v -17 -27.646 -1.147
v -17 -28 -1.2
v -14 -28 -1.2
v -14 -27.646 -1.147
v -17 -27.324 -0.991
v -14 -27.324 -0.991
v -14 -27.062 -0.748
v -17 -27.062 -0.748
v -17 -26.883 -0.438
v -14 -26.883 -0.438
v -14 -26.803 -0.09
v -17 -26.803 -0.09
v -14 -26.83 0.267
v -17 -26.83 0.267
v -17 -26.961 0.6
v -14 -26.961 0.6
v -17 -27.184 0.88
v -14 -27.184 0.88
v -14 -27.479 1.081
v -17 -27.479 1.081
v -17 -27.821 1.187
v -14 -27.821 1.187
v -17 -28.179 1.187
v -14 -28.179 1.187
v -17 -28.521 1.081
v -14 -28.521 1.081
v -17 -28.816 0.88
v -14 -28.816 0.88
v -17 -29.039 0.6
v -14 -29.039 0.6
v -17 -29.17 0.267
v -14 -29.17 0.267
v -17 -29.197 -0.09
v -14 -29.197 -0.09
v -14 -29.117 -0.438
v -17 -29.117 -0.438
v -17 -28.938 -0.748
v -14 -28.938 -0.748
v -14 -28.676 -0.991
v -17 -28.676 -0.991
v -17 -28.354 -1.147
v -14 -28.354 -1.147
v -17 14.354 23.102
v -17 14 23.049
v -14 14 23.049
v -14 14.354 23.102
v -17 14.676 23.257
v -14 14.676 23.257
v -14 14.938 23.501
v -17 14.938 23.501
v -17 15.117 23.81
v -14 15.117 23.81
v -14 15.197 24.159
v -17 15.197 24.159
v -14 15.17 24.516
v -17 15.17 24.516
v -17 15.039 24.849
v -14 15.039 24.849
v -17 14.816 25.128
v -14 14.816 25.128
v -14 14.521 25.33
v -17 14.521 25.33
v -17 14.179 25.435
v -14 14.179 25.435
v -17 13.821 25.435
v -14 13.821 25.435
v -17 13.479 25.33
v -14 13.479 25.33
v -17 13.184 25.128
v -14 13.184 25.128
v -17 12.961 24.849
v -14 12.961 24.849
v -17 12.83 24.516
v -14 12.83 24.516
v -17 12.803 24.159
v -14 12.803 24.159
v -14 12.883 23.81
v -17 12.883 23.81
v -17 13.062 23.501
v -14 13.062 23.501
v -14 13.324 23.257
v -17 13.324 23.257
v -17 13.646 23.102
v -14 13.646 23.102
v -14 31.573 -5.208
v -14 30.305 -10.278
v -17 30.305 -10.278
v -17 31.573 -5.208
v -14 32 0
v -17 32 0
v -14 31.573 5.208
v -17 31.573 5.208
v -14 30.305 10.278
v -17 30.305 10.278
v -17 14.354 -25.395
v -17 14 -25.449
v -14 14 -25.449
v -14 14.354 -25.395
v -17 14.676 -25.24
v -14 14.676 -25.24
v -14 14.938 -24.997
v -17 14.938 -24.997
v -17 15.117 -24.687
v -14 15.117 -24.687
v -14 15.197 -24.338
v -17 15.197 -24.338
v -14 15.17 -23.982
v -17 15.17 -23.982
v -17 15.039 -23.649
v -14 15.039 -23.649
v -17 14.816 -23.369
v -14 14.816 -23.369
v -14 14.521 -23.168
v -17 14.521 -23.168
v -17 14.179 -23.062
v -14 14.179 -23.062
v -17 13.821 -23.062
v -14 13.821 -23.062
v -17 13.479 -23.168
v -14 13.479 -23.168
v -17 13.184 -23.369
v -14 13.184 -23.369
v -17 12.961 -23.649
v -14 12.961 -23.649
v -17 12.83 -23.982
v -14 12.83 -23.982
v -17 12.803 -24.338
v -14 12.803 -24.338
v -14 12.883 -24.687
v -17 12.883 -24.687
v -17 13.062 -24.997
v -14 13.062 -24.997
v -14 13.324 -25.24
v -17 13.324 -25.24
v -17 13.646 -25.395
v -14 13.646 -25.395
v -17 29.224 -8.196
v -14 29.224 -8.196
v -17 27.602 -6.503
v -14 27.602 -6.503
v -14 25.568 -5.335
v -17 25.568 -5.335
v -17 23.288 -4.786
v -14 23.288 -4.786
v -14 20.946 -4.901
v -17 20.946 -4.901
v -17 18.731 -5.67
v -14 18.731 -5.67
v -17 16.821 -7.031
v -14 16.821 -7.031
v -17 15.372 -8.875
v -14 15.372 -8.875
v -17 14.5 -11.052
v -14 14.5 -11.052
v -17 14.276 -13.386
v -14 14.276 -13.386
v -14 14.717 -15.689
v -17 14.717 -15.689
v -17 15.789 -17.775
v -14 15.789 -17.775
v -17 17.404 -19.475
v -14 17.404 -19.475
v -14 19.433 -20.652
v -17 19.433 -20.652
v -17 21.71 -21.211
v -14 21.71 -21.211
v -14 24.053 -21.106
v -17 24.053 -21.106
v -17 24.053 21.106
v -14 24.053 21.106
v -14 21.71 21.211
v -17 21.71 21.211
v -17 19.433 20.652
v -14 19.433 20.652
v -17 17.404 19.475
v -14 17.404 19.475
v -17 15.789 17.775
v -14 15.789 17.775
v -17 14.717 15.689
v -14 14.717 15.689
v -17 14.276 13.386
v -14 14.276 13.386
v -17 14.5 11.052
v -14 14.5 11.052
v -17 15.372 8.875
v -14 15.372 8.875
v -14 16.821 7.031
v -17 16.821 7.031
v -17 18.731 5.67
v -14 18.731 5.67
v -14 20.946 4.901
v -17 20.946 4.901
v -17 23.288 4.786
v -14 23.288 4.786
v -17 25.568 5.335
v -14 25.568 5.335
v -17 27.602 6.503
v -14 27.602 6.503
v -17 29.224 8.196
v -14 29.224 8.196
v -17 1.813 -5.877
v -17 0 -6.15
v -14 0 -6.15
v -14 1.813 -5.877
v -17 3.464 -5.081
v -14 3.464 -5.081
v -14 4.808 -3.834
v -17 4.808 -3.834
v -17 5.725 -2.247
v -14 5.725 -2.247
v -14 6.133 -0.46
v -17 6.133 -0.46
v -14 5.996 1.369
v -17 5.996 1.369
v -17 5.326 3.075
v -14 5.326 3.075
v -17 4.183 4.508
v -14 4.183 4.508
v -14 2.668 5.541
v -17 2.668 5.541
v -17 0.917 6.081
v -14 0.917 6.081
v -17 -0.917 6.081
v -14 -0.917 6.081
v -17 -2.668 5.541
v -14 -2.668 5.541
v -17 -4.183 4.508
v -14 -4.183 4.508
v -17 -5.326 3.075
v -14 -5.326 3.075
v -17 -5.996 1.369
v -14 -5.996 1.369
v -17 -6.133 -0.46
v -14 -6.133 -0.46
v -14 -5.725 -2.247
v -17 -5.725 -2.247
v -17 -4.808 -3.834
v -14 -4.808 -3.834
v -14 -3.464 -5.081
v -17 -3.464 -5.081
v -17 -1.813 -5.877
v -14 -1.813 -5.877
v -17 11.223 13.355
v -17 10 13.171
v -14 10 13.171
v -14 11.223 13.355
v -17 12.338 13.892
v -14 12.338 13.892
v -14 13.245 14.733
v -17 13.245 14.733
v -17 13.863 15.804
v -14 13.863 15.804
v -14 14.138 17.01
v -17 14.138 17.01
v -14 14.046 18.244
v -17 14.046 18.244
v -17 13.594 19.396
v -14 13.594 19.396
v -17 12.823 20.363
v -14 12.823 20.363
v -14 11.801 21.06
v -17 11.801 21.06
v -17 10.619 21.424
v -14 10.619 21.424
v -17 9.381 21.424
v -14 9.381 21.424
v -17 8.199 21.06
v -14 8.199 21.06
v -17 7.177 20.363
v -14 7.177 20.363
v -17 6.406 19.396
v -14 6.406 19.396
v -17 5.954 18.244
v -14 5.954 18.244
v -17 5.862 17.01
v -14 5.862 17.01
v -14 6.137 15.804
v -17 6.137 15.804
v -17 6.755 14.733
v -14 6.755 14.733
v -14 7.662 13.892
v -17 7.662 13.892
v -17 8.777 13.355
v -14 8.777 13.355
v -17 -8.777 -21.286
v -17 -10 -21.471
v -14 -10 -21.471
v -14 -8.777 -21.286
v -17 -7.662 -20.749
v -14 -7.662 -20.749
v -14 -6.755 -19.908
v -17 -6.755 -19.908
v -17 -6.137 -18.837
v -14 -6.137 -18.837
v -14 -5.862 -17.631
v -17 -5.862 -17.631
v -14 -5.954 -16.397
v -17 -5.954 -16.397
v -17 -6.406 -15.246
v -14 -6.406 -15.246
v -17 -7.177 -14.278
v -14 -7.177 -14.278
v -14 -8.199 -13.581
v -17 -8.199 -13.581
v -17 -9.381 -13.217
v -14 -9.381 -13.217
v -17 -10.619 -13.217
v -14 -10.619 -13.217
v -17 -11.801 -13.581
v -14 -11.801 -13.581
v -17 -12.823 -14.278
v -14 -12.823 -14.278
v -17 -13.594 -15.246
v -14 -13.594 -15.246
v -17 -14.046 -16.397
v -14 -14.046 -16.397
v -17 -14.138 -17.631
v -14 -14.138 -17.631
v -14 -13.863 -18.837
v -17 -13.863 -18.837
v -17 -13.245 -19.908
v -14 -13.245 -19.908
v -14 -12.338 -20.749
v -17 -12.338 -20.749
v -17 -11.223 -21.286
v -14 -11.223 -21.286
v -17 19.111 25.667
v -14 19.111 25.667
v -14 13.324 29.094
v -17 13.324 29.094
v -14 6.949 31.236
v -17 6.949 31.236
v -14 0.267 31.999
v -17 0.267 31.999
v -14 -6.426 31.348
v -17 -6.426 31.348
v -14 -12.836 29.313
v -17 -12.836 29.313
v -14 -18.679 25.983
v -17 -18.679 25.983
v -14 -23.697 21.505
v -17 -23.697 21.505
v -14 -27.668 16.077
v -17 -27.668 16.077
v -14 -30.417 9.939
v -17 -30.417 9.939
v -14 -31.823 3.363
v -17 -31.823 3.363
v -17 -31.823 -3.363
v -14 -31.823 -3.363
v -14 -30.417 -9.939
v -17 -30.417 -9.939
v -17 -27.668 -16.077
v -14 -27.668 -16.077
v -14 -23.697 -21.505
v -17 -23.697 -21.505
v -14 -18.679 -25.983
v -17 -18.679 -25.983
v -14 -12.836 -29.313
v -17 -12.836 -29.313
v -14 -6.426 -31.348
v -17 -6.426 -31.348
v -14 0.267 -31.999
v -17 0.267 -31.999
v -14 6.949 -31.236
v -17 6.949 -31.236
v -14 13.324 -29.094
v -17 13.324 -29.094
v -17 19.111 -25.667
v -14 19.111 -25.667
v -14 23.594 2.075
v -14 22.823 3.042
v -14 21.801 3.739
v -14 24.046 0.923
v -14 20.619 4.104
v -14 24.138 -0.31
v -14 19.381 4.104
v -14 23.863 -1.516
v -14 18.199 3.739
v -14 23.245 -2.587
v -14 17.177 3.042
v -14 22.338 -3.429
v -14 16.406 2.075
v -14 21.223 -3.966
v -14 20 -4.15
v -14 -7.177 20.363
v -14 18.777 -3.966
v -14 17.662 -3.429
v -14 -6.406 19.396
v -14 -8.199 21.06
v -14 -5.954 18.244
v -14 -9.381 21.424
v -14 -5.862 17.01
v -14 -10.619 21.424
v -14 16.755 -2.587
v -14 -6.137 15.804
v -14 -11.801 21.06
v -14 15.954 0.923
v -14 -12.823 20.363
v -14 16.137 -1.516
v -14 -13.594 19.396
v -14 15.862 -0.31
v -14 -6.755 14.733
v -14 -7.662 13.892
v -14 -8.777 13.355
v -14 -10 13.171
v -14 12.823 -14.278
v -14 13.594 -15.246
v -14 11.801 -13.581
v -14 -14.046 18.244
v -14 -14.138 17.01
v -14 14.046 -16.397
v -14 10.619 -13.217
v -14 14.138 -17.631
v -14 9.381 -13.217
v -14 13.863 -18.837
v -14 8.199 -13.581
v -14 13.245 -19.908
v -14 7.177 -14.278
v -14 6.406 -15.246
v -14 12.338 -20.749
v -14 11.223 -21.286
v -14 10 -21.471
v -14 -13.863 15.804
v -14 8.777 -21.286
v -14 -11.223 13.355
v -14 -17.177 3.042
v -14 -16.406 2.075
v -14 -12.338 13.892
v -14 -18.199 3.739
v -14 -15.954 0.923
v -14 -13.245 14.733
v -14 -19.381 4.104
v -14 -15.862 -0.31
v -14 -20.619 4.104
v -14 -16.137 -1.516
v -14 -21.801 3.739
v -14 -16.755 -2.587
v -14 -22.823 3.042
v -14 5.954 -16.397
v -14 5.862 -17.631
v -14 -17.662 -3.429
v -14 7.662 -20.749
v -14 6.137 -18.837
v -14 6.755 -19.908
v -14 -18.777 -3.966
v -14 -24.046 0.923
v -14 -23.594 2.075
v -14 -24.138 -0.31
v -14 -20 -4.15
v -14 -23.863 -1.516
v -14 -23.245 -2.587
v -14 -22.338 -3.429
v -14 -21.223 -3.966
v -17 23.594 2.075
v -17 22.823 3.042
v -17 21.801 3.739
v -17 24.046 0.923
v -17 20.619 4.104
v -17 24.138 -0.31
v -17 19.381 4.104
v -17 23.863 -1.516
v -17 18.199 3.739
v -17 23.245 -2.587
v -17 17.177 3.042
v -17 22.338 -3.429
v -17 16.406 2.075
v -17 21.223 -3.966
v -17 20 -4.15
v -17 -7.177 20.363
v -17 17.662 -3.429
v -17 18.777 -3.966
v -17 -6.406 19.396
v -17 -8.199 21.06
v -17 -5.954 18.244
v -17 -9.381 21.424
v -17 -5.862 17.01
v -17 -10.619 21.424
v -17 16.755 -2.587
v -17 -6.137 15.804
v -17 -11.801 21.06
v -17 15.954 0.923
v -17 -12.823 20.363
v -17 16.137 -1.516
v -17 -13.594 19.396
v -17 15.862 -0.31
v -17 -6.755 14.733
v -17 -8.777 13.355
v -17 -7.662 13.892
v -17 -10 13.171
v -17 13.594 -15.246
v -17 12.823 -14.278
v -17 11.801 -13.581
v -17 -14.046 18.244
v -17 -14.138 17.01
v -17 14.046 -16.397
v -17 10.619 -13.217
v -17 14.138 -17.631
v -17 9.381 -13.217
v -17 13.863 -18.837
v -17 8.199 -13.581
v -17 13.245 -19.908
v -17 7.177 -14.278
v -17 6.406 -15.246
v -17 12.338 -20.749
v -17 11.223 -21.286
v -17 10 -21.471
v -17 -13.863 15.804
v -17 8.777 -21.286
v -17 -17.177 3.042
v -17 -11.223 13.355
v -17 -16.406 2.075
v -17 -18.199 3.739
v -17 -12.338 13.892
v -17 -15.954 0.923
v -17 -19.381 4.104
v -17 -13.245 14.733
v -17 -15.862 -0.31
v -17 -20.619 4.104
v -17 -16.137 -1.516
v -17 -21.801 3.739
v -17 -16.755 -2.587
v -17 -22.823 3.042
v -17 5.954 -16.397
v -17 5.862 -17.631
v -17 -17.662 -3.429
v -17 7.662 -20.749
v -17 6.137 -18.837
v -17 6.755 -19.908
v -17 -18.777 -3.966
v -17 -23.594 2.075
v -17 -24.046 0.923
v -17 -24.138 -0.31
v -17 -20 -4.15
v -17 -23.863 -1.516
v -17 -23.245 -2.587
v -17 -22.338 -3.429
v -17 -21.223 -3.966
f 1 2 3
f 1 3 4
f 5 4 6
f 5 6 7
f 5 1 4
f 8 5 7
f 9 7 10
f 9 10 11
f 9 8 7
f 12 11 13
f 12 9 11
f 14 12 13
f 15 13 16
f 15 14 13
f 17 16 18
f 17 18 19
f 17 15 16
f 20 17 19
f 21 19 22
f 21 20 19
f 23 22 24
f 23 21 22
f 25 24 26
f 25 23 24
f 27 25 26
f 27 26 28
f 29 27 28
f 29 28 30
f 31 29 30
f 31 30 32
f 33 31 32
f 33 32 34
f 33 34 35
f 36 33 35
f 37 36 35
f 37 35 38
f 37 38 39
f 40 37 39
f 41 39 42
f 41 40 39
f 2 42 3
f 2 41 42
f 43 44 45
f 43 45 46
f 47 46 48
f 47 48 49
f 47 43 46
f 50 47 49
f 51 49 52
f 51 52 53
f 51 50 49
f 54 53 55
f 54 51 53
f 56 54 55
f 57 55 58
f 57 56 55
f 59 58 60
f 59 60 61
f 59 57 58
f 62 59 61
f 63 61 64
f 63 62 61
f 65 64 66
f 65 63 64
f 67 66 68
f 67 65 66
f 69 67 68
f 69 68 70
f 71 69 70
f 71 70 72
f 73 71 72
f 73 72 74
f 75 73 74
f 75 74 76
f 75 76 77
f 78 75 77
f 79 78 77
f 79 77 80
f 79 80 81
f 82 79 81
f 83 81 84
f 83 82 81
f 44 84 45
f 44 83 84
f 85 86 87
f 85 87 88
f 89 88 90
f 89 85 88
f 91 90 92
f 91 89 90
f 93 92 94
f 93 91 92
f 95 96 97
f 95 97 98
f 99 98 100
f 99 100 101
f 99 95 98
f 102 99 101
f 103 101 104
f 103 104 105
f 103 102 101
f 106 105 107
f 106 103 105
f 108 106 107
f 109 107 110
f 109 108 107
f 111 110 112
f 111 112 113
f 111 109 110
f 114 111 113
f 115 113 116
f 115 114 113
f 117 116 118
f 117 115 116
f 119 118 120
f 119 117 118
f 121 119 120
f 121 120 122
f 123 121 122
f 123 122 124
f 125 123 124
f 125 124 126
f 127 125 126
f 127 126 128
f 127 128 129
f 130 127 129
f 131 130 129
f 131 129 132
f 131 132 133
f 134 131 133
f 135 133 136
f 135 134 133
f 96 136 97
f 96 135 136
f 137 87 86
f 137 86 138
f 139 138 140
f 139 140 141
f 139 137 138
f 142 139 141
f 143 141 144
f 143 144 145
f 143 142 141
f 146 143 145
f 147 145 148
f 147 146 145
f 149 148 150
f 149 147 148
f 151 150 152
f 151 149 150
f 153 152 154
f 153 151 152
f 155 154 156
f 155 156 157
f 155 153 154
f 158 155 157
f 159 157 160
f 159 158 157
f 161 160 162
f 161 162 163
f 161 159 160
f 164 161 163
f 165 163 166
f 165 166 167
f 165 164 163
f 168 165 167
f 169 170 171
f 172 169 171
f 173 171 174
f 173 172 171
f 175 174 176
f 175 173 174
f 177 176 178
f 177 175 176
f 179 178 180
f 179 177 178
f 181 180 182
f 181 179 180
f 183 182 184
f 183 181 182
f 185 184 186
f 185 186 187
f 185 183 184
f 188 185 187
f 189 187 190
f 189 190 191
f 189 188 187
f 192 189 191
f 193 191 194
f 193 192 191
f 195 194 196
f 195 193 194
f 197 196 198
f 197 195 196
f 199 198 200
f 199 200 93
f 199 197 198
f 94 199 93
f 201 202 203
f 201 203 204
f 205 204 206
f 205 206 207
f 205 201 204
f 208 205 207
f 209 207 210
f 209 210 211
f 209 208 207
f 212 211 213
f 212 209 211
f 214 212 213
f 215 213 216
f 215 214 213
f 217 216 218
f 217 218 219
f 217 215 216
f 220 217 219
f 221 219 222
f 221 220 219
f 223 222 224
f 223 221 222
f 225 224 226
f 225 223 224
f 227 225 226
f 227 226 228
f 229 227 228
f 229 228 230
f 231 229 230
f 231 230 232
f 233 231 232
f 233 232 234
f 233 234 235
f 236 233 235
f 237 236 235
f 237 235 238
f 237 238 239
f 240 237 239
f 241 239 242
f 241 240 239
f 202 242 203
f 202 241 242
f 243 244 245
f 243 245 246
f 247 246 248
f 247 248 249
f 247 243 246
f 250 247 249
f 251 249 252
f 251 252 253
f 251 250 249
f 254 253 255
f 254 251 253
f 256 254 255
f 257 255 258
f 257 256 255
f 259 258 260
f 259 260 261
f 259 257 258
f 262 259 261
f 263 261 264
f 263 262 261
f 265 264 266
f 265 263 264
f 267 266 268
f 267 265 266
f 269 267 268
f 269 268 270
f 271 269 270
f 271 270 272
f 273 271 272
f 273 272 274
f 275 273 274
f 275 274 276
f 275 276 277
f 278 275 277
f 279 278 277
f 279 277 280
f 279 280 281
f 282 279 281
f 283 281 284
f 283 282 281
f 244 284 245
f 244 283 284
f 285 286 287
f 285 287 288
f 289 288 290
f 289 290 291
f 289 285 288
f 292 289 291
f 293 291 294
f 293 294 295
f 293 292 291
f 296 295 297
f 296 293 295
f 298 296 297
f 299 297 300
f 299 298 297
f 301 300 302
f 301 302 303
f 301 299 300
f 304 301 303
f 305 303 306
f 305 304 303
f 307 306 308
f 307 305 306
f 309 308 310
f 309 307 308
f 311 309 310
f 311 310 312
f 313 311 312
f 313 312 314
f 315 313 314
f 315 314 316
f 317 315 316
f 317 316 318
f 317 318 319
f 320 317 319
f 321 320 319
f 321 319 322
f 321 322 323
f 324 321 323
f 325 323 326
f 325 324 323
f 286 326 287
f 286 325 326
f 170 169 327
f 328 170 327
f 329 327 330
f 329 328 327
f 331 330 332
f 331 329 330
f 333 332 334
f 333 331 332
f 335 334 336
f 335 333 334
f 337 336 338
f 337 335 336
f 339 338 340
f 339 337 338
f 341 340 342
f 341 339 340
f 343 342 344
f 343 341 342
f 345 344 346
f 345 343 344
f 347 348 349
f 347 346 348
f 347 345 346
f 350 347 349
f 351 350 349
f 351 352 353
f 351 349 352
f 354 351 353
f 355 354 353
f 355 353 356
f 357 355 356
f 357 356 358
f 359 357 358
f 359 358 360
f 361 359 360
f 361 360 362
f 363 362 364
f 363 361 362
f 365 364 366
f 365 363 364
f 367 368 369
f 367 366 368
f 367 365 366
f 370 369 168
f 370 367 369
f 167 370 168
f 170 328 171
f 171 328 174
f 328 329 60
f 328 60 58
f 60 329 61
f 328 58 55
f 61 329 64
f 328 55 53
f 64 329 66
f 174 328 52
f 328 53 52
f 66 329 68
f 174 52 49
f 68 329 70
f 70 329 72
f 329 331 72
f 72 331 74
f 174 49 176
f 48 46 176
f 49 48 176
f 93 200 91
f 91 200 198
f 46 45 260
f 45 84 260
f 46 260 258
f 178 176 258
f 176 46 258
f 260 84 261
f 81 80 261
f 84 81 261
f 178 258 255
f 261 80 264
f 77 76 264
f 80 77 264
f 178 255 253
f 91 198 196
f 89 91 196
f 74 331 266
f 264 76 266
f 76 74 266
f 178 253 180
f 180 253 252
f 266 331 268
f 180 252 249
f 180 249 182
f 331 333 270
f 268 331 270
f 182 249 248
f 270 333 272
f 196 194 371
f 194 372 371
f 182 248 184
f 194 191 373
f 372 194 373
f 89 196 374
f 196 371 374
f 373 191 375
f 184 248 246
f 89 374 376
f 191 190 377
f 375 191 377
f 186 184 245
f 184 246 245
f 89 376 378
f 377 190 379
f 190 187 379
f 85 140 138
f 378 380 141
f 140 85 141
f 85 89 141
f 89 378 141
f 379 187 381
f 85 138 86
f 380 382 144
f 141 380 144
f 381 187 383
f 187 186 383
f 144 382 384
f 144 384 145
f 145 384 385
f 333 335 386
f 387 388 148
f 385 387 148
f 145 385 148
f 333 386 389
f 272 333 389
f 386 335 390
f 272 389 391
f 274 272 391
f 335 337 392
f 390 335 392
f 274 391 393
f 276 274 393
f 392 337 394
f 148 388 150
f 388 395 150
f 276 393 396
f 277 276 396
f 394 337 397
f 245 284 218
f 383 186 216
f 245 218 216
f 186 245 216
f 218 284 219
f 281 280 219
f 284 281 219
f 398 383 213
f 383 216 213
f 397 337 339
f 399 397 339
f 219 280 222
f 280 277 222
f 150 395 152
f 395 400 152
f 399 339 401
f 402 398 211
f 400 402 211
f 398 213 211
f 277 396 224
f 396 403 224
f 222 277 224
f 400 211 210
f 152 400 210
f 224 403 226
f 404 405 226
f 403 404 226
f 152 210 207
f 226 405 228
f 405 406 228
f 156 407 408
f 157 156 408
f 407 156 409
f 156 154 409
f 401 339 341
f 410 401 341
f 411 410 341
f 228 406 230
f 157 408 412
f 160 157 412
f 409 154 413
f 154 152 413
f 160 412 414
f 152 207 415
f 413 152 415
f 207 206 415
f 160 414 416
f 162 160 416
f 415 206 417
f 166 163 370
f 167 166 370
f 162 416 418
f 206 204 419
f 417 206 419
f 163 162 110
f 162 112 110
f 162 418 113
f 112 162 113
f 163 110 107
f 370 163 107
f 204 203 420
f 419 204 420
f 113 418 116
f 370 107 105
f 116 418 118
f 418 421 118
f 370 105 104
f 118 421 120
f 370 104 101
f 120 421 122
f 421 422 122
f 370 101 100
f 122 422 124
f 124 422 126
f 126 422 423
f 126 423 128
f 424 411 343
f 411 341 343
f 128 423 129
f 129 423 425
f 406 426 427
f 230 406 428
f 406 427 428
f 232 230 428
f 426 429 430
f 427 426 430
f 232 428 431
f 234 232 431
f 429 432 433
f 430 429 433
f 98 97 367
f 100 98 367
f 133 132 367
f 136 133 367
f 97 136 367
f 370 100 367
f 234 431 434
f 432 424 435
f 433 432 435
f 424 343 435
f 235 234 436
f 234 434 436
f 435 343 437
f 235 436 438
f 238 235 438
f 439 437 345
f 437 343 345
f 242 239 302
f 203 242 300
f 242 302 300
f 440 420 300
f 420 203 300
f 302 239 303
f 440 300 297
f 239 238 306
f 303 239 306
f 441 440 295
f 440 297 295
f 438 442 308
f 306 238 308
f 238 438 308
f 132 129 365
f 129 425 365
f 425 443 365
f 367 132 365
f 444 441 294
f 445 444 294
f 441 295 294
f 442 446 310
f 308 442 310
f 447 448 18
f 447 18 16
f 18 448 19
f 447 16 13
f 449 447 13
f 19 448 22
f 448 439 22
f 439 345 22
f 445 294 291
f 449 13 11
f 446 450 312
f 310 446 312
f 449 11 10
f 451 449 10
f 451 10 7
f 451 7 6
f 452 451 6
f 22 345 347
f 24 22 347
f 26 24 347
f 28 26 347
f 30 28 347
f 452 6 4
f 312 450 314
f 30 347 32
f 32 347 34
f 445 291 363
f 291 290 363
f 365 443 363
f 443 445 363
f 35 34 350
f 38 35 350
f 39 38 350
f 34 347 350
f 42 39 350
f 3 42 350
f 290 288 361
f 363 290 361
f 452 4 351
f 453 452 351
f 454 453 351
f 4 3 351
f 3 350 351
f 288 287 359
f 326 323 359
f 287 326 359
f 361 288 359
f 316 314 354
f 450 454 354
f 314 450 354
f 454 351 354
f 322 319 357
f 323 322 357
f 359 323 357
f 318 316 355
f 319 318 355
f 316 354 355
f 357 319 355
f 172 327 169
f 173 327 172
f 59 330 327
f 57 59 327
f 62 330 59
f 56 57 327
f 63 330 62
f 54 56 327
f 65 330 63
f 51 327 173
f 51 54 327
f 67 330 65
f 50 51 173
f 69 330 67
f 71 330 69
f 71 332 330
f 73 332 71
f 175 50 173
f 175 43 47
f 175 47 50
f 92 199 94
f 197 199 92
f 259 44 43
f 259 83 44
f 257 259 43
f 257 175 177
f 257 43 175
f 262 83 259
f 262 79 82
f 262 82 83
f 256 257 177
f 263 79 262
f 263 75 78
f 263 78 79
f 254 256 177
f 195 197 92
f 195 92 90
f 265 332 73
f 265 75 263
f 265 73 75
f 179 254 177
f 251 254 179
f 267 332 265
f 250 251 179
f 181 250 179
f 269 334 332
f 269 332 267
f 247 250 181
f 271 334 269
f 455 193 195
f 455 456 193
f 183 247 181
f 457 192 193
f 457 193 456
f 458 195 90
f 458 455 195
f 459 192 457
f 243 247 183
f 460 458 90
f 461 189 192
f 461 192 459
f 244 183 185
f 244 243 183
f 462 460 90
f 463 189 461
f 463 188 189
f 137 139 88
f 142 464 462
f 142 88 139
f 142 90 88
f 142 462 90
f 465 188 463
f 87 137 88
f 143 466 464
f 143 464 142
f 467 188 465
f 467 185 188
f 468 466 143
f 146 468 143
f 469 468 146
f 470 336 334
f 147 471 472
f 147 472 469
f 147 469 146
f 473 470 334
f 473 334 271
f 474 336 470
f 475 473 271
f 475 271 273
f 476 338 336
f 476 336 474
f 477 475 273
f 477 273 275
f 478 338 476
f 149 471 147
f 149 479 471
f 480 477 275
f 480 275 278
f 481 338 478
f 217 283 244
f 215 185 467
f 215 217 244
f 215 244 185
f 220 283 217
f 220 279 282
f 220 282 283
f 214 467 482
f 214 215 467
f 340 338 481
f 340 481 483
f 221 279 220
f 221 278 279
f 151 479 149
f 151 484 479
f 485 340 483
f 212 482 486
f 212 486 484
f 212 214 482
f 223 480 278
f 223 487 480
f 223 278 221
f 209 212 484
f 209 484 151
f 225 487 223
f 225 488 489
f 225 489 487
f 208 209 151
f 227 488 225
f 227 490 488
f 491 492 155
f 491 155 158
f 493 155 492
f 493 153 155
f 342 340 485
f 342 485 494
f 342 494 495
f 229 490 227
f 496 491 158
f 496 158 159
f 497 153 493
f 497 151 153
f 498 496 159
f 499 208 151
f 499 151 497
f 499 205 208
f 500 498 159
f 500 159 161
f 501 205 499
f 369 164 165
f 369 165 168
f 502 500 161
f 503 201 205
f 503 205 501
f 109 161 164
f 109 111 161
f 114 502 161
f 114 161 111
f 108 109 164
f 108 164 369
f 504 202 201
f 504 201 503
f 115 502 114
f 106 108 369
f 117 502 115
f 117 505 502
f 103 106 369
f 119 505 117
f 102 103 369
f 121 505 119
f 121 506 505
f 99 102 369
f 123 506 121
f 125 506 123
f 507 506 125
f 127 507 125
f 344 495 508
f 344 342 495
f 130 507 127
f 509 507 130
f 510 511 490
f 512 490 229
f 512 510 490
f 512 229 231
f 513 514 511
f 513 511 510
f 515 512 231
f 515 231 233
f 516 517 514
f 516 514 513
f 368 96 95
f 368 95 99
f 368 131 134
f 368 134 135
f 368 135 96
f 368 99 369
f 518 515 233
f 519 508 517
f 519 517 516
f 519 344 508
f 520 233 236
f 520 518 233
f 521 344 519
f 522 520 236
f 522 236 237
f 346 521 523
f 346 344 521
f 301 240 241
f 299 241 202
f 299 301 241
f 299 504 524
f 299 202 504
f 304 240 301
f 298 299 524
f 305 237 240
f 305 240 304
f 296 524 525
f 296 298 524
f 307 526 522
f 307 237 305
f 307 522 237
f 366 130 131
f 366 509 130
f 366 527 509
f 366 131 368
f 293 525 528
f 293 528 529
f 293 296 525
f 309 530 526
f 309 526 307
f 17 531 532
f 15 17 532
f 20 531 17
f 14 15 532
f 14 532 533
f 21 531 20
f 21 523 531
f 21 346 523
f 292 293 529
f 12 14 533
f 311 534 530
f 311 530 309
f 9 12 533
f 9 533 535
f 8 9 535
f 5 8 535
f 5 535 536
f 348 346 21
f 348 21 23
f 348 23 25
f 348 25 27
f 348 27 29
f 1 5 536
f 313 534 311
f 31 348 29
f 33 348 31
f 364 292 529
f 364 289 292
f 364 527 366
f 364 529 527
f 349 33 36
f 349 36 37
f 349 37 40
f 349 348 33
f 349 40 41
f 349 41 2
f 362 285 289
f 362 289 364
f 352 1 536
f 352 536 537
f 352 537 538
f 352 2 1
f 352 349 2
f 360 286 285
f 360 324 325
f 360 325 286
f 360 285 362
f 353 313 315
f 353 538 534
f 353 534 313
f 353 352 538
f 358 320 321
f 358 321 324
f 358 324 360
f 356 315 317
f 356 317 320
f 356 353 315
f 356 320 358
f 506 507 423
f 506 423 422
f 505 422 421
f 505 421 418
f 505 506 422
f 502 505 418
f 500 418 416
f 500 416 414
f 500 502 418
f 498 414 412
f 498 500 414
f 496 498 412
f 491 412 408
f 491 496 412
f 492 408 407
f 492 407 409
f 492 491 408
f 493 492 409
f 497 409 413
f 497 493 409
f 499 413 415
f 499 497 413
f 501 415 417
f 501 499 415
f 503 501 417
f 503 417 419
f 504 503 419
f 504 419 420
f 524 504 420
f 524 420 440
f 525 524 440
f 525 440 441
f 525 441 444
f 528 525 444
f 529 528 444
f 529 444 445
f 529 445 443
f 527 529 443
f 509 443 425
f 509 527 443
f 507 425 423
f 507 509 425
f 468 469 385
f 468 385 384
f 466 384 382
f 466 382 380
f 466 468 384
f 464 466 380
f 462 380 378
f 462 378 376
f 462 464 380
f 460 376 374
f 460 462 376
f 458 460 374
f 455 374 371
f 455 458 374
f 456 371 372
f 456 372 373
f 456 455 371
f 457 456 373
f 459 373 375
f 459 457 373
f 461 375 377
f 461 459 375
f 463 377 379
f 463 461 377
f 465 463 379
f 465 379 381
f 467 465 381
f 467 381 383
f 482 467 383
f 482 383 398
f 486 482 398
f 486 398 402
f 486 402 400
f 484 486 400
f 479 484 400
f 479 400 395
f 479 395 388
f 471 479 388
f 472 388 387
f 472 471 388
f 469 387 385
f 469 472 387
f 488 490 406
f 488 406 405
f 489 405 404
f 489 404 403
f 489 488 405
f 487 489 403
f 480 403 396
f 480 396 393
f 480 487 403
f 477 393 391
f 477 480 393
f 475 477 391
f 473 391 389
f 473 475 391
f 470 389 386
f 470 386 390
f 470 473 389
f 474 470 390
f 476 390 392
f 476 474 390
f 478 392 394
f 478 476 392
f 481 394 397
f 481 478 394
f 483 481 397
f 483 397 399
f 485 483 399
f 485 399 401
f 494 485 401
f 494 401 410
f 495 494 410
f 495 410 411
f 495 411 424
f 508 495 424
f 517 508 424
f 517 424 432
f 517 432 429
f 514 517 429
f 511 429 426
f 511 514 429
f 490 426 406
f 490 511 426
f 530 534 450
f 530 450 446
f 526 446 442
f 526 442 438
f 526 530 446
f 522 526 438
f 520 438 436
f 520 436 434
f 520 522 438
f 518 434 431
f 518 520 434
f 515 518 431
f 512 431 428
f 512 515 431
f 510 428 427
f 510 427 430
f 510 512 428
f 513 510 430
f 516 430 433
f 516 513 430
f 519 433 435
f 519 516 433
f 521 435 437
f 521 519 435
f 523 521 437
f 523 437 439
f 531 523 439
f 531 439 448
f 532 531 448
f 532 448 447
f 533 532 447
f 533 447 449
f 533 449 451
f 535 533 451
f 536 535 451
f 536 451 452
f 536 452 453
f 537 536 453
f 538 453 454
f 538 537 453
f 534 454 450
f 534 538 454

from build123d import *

# Parameters (mm, degrees)
AXIAL_BLANK_PROFILE_W                     = 3
AXIAL_BLANK_PROFILE_H                     = 32
MAGNET_BASE_START                         = -17
MAGNET_BASE_LOCATOR_BORES_SKETCH_R        = 6.15
MAGNET_BASE_LOCATOR_BORES_SKETCH_R_2      = 4.15
MAGNET_BASE_LOCATOR_BORES_DEPTH           = 3
OPEN_START                                = -17
OPEN_FITTING_ROUTE_RELIEFS_SKETCH_R       = 8.25
OPEN_FITTING_ROUTE_RELIEFS_DEPTH          = 3
THREE_START                               = -17
THREE_M2_LOCATOR_CLEARANCE_HOLES_SKETCH_R = 1.2
THREE_M2_LOCATOR_CLEARANCE_HOLES_DEPTH    = 3


with BuildPart() as part:
    # Axial blank profile → Native revolved blank (revolve)
    with BuildSketch(Plane.XY, mode=Mode.PRIVATE) as native_revolved_blank_sk:
        with Locations((-15.5, 16)):
            Rectangle(AXIAL_BLANK_PROFILE_W, AXIAL_BLANK_PROFILE_H)
    revolve(native_revolved_blank_sk.sketch.rotate(Axis((-60, 0, 0), (1, 0, 0)), 90), axis=Axis((-60, 0, 0), (1, 0, 0)))

    # Magnet-base locator bores sketch → Magnet-base locator bores (cut)
    with BuildSketch(Plane(origin=(0, 0, 0), x_dir=(0, 0, -1), z_dir=(1, 0, 0)).offset(MAGNET_BASE_START)):
        Circle(MAGNET_BASE_LOCATOR_BORES_SKETCH_R)
        with Locations((0, 20)):
            Circle(MAGNET_BASE_LOCATOR_BORES_SKETCH_R_2)
        with Locations((-17.320508076, 10)):
            Circle(MAGNET_BASE_LOCATOR_BORES_SKETCH_R_2)
        with Locations((-17.320508076, -10)):
            Circle(MAGNET_BASE_LOCATOR_BORES_SKETCH_R_2)
        with Locations((0, -20)):
            Circle(MAGNET_BASE_LOCATOR_BORES_SKETCH_R_2)
        with Locations((17.320508076, -10)):
            Circle(MAGNET_BASE_LOCATOR_BORES_SKETCH_R_2)
        with Locations((17.320508076, 10)):
            Circle(MAGNET_BASE_LOCATOR_BORES_SKETCH_R_2)
    extrude(amount=MAGNET_BASE_LOCATOR_BORES_DEPTH, mode=Mode.SUBTRACT)

    # Open fitting-route reliefs sketch → Open fitting-route reliefs (cut)
    with BuildSketch(Plane(origin=(0, 0, 0), x_dir=(0, 0, -1), z_dir=(1, 0, 0)).offset(OPEN_START)):
        with Locations((-13, 22.516660498)):
            Circle(OPEN_FITTING_ROUTE_RELIEFS_SKETCH_R)
        with Locations((13, 22.516660498)):
            Circle(OPEN_FITTING_ROUTE_RELIEFS_SKETCH_R)
    extrude(amount=OPEN_FITTING_ROUTE_RELIEFS_DEPTH, mode=Mode.SUBTRACT)

    # Three M2 locator clearance holes sketch → Three M2 locator clearance holes (cut)
    with BuildSketch(Plane(origin=(0, 0, 0), x_dir=(0, 0, -1), z_dir=(1, 0, 0)).offset(THREE_START)):
        with Locations((-24.248711306, 14)):
            Circle(THREE_M2_LOCATOR_CLEARANCE_HOLES_SKETCH_R)
        with Locations((0, -28)):
            Circle(THREE_M2_LOCATOR_CLEARANCE_HOLES_SKETCH_R)
        with Locations((24.248711306, 14)):
            Circle(THREE_M2_LOCATOR_CLEARANCE_HOLES_SKETCH_R)
    extrude(amount=THREE_M2_LOCATOR_CLEARANCE_HOLES_DEPTH, mode=Mode.SUBTRACT)


solid = part.part
